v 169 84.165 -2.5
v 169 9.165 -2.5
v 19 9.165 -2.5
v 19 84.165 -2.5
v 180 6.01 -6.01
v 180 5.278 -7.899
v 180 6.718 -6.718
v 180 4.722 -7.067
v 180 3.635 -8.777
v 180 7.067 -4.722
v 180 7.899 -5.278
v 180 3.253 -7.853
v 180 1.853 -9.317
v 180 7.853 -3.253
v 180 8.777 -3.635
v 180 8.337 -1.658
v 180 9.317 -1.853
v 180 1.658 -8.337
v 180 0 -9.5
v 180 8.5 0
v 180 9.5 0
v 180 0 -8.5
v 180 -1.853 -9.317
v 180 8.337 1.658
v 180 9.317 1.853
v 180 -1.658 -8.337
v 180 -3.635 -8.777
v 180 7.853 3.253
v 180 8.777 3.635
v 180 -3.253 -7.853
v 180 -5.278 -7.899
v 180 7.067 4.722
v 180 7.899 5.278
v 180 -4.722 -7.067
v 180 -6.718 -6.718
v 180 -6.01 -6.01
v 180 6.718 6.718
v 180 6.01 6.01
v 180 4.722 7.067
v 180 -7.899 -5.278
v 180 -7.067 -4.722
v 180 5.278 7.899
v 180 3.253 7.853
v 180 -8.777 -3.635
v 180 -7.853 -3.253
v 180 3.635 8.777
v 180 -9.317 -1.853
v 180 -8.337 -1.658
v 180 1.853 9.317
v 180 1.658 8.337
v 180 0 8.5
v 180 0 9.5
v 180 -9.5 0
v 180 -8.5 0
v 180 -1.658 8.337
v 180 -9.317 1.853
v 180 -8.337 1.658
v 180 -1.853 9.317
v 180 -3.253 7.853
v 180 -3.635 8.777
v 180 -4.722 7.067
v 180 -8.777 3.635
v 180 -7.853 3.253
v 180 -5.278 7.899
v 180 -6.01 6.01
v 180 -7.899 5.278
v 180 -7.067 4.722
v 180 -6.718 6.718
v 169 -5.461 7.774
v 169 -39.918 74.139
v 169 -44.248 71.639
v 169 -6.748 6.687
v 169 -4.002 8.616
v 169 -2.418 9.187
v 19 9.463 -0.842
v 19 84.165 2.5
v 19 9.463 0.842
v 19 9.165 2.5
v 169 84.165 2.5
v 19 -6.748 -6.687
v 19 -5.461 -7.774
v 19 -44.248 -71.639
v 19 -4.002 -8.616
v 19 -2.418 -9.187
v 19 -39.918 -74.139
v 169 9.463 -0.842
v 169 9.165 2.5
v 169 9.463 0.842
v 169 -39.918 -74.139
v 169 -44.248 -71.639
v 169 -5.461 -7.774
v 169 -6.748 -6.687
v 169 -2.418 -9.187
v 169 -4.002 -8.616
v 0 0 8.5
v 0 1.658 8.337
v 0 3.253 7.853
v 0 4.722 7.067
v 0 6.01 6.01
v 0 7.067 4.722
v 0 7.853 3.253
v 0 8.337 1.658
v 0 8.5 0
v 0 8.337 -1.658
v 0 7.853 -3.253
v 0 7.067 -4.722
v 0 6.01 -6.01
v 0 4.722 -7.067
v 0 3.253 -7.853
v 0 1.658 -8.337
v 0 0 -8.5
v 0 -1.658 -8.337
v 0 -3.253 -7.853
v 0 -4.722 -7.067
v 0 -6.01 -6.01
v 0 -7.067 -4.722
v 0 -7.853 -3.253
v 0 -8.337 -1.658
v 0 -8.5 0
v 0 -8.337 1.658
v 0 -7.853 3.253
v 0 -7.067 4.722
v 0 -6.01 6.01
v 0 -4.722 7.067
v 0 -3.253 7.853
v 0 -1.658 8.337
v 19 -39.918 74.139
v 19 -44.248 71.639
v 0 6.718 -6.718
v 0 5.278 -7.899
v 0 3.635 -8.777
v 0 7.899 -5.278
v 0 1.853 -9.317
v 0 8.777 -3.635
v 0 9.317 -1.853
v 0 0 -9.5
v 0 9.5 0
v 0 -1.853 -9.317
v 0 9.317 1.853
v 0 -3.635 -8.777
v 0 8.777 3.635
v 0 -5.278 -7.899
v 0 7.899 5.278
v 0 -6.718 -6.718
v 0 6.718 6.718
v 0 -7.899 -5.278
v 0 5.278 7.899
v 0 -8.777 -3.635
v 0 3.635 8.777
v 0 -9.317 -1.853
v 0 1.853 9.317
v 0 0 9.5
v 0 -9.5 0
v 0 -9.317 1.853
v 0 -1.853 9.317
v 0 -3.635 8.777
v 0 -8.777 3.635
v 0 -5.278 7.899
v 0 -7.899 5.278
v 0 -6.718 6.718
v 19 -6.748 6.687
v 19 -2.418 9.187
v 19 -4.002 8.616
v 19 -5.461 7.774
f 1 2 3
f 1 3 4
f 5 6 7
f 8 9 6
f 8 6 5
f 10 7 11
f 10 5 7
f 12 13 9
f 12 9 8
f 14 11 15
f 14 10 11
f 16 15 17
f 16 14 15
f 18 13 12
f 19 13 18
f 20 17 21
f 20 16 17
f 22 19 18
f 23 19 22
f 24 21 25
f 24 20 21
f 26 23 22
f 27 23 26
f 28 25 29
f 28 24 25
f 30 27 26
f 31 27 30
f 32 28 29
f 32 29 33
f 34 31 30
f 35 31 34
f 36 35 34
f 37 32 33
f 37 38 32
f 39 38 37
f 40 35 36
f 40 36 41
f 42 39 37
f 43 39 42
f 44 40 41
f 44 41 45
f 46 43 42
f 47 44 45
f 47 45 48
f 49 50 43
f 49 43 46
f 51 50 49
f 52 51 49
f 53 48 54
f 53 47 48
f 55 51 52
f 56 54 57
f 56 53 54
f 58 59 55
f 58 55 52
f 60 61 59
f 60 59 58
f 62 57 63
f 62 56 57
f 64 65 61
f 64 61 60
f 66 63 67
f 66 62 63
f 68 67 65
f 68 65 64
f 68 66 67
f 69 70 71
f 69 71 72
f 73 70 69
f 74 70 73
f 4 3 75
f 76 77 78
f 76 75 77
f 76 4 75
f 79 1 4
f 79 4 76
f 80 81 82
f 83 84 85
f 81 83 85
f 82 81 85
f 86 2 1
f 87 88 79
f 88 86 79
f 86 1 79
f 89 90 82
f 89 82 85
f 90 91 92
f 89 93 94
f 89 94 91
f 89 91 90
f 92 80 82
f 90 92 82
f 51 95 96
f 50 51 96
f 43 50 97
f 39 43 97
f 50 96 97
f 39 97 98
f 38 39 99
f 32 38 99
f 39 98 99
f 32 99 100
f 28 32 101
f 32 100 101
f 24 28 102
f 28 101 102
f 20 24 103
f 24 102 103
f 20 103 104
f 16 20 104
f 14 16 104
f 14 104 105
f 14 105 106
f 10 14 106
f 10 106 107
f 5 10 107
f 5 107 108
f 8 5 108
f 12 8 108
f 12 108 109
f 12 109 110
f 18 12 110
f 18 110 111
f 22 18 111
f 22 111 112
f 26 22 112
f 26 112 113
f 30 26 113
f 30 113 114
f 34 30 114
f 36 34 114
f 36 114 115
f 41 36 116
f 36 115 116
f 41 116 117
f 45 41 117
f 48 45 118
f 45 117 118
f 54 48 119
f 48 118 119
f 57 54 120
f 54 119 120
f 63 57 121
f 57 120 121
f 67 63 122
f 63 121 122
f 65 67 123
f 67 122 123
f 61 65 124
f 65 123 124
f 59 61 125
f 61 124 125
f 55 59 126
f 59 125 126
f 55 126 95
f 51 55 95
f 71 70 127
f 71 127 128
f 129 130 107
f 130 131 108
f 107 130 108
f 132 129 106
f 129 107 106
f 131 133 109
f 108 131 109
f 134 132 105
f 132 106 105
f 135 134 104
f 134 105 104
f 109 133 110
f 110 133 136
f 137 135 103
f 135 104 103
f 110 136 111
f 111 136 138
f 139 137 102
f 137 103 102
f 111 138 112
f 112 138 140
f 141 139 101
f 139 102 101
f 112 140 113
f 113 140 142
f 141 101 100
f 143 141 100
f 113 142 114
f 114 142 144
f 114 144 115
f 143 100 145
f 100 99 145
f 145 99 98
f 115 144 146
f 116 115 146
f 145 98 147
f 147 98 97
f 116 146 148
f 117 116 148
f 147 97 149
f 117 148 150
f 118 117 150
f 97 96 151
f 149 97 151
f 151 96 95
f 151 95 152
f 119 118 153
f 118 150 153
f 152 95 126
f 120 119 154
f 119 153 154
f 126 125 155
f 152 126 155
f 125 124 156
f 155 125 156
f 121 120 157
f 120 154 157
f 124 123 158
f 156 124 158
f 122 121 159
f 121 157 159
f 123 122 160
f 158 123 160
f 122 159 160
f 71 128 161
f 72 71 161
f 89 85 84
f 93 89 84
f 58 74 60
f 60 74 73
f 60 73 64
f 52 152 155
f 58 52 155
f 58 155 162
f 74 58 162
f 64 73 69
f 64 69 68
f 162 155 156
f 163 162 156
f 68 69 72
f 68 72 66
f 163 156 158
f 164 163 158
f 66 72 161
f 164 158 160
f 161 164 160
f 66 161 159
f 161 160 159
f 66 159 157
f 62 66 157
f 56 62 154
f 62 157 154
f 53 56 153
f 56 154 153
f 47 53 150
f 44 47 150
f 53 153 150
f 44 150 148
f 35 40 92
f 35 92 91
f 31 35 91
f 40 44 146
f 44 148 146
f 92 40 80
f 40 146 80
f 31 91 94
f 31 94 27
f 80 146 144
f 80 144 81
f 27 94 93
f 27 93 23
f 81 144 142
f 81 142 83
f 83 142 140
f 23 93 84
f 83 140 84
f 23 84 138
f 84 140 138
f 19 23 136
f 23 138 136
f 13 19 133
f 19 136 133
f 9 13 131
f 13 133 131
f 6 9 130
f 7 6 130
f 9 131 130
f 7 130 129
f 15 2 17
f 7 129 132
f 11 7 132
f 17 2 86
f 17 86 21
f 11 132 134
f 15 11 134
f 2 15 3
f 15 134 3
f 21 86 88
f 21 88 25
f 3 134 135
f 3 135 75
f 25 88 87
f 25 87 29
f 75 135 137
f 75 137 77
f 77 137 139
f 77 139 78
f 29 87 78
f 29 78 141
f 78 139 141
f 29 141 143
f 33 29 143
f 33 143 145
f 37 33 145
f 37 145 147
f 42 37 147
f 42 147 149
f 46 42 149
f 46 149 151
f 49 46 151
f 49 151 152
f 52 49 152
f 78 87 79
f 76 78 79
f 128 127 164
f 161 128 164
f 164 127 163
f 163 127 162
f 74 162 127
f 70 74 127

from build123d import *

# Parameters (mm, degrees)
CROQUIS1_R              = 9.5
SALIENTE_EXTRUIR1_DEPTH = 180
SALIENTE_EXTRUIR2_START = -169
CROQUIS2_W              = 5
CROQUIS2_H              = 75
SALIENTE_EXTRUIR2_DEPTH = 150
CROQUIS3_R              = 8.5
CORTAR_EXTRUIR1_DEPTH   = 213.085802537


with BuildPart() as part:
    # Croquis1 → Saliente-Extruir1 (new body)
    with BuildSketch(Plane(origin=(0, 0, 0), x_dir=(0, 0, -1), z_dir=(1, 0, 0))):
        with Locations(Location((0, 0, 0), (0, 0, 180))):
            Circle(CROQUIS1_R)
    extrude(amount=SALIENTE_EXTRUIR1_DEPTH)

    # Croquis2 → Saliente-Extruir2 (add)
    with BuildSketch(Plane.ZY.offset(SALIENTE_EXTRUIR2_START)):
        Polygon((74.139159217, -39.917512185), (71.639159217, -44.247639204), (6.687253933, -6.747639204), (9.187253933, -2.417512185), align=None)
        with Locations((0, 46.66515139)):
            Rectangle(CROQUIS2_W, CROQUIS2_H)
        Polygon((-71.639159217, -44.247639204), (-74.139159217, -39.917512185), (-9.187253933, -2.417512185), (-6.687253933, -6.747639204), align=None)
    extrude(amount=SALIENTE_EXTRUIR2_DEPTH)

    # Croquis3 → Cortar-Extruir1 (cut, through all)
    with BuildSketch(Plane.ZY):
        Circle(CROQUIS3_R)
    extrude(amount=-CORTAR_EXTRUIR1_DEPTH, mode=Mode.SUBTRACT)


solid = part.part
